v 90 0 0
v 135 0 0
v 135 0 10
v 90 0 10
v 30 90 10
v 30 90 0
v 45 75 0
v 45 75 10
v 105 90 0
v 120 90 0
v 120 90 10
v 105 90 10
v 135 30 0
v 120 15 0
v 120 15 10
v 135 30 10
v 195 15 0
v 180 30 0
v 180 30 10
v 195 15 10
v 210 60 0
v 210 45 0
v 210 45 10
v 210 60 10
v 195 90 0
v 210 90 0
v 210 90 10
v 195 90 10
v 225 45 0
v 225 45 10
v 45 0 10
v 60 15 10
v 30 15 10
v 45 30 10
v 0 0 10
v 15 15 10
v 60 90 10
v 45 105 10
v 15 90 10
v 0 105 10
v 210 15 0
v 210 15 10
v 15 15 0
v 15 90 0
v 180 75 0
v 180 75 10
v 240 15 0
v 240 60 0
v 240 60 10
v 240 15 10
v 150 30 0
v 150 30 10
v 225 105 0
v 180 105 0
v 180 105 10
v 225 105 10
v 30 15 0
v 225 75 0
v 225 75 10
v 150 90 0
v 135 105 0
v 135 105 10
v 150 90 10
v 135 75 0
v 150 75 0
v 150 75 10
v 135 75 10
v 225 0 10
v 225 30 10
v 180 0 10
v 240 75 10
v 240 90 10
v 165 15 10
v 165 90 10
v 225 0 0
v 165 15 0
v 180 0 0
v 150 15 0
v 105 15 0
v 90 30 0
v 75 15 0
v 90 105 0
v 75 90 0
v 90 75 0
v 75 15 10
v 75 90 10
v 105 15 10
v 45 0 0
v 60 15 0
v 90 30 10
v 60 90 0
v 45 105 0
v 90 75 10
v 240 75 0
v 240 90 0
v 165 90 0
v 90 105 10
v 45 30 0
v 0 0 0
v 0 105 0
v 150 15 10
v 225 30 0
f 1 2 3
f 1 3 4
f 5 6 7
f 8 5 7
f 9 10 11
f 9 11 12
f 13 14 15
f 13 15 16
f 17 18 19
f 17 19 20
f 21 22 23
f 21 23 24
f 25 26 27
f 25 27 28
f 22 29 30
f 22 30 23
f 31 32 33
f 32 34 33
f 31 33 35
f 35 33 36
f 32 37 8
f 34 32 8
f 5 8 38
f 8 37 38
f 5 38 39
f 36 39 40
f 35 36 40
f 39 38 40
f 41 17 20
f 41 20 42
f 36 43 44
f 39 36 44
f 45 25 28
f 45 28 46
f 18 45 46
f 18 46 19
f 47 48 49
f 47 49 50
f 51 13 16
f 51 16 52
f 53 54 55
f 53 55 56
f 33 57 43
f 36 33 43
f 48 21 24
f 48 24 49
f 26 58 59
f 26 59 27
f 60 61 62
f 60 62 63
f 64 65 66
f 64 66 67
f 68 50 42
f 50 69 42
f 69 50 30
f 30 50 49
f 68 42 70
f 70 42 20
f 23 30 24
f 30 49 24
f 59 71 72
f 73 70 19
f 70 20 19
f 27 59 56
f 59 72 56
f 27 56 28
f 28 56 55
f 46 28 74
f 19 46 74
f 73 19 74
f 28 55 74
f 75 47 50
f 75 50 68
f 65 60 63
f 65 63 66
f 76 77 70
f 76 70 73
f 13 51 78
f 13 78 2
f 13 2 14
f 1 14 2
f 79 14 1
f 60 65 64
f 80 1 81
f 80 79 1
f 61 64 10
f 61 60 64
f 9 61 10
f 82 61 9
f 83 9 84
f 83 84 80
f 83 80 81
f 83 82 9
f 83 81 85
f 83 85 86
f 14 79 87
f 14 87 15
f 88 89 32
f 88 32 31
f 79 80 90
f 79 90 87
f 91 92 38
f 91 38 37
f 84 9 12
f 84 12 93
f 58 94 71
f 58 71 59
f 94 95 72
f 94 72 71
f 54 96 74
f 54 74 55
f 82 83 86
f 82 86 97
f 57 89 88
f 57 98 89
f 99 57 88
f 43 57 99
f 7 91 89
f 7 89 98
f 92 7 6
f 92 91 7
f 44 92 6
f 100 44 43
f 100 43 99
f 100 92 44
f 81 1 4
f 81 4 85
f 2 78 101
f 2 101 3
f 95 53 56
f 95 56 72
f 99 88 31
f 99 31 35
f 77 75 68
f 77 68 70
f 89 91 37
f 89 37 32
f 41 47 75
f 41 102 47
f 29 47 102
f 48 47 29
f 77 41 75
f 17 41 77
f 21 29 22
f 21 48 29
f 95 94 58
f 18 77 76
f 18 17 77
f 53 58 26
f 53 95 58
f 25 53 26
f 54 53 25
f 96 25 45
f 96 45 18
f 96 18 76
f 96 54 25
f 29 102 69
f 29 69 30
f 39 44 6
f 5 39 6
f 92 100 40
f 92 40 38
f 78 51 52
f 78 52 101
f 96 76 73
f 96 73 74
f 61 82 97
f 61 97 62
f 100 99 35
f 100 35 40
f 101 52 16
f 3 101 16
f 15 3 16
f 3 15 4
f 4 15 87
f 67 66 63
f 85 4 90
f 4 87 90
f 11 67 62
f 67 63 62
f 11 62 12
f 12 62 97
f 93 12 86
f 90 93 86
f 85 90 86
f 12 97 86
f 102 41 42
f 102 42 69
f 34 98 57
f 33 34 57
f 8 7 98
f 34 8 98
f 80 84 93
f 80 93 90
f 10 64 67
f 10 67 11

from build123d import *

# Parameters (mm, degrees)
EXTRUDE1_DEPTH   = 10
EXTRUDE1_2_DEPTH = 10
EXTRUDE1_3_DEPTH = 10


with BuildPart() as part:
    # Sketch2 → Extrude1 (new body)
    with BuildSketch(Plane.XY):
        Polygon((0, 0), (0, 105), (45, 105), (60, 90), (60, 15), (45, 0), align=None)
        Polygon((15, 90), (30, 90), (45, 75), (45, 30), (30, 15), (15, 15), align=None, mode=Mode.SUBTRACT)
    extrude(amount=EXTRUDE1_DEPTH)


with BuildPart() as body_2:
    # Sketch2 → Extrude1 2 (new body)
    with BuildSketch(Plane.XY):
        Polygon((90, 0), (75, 15), (75, 90), (90, 105), (135, 105), (150, 90), (150, 75), (135, 75), (120, 90), (105, 90), (90, 75), (90, 30), (105, 15), (120, 15), (135, 30), (150, 30), (150, 15), (135, 0), align=None)
    extrude(amount=EXTRUDE1_2_DEPTH)


with BuildPart() as body_3:
    # Sketch2 → Extrude1 3 (new body)
    with BuildSketch(Plane.XY):
        Polygon((180, 0), (165, 15), (165, 90), (180, 105), (225, 105), (240, 90), (240, 75), (225, 75), (210, 90), (195, 90), (180, 75), (180, 30), (195, 15), (210, 15), (225, 30), (225, 45), (210, 45), (210, 60), (240, 60), (240, 15), (225, 0), align=None)
    extrude(amount=EXTRUDE1_3_DEPTH)


solid = Compound([part.part, body_2.part, body_3.part])
